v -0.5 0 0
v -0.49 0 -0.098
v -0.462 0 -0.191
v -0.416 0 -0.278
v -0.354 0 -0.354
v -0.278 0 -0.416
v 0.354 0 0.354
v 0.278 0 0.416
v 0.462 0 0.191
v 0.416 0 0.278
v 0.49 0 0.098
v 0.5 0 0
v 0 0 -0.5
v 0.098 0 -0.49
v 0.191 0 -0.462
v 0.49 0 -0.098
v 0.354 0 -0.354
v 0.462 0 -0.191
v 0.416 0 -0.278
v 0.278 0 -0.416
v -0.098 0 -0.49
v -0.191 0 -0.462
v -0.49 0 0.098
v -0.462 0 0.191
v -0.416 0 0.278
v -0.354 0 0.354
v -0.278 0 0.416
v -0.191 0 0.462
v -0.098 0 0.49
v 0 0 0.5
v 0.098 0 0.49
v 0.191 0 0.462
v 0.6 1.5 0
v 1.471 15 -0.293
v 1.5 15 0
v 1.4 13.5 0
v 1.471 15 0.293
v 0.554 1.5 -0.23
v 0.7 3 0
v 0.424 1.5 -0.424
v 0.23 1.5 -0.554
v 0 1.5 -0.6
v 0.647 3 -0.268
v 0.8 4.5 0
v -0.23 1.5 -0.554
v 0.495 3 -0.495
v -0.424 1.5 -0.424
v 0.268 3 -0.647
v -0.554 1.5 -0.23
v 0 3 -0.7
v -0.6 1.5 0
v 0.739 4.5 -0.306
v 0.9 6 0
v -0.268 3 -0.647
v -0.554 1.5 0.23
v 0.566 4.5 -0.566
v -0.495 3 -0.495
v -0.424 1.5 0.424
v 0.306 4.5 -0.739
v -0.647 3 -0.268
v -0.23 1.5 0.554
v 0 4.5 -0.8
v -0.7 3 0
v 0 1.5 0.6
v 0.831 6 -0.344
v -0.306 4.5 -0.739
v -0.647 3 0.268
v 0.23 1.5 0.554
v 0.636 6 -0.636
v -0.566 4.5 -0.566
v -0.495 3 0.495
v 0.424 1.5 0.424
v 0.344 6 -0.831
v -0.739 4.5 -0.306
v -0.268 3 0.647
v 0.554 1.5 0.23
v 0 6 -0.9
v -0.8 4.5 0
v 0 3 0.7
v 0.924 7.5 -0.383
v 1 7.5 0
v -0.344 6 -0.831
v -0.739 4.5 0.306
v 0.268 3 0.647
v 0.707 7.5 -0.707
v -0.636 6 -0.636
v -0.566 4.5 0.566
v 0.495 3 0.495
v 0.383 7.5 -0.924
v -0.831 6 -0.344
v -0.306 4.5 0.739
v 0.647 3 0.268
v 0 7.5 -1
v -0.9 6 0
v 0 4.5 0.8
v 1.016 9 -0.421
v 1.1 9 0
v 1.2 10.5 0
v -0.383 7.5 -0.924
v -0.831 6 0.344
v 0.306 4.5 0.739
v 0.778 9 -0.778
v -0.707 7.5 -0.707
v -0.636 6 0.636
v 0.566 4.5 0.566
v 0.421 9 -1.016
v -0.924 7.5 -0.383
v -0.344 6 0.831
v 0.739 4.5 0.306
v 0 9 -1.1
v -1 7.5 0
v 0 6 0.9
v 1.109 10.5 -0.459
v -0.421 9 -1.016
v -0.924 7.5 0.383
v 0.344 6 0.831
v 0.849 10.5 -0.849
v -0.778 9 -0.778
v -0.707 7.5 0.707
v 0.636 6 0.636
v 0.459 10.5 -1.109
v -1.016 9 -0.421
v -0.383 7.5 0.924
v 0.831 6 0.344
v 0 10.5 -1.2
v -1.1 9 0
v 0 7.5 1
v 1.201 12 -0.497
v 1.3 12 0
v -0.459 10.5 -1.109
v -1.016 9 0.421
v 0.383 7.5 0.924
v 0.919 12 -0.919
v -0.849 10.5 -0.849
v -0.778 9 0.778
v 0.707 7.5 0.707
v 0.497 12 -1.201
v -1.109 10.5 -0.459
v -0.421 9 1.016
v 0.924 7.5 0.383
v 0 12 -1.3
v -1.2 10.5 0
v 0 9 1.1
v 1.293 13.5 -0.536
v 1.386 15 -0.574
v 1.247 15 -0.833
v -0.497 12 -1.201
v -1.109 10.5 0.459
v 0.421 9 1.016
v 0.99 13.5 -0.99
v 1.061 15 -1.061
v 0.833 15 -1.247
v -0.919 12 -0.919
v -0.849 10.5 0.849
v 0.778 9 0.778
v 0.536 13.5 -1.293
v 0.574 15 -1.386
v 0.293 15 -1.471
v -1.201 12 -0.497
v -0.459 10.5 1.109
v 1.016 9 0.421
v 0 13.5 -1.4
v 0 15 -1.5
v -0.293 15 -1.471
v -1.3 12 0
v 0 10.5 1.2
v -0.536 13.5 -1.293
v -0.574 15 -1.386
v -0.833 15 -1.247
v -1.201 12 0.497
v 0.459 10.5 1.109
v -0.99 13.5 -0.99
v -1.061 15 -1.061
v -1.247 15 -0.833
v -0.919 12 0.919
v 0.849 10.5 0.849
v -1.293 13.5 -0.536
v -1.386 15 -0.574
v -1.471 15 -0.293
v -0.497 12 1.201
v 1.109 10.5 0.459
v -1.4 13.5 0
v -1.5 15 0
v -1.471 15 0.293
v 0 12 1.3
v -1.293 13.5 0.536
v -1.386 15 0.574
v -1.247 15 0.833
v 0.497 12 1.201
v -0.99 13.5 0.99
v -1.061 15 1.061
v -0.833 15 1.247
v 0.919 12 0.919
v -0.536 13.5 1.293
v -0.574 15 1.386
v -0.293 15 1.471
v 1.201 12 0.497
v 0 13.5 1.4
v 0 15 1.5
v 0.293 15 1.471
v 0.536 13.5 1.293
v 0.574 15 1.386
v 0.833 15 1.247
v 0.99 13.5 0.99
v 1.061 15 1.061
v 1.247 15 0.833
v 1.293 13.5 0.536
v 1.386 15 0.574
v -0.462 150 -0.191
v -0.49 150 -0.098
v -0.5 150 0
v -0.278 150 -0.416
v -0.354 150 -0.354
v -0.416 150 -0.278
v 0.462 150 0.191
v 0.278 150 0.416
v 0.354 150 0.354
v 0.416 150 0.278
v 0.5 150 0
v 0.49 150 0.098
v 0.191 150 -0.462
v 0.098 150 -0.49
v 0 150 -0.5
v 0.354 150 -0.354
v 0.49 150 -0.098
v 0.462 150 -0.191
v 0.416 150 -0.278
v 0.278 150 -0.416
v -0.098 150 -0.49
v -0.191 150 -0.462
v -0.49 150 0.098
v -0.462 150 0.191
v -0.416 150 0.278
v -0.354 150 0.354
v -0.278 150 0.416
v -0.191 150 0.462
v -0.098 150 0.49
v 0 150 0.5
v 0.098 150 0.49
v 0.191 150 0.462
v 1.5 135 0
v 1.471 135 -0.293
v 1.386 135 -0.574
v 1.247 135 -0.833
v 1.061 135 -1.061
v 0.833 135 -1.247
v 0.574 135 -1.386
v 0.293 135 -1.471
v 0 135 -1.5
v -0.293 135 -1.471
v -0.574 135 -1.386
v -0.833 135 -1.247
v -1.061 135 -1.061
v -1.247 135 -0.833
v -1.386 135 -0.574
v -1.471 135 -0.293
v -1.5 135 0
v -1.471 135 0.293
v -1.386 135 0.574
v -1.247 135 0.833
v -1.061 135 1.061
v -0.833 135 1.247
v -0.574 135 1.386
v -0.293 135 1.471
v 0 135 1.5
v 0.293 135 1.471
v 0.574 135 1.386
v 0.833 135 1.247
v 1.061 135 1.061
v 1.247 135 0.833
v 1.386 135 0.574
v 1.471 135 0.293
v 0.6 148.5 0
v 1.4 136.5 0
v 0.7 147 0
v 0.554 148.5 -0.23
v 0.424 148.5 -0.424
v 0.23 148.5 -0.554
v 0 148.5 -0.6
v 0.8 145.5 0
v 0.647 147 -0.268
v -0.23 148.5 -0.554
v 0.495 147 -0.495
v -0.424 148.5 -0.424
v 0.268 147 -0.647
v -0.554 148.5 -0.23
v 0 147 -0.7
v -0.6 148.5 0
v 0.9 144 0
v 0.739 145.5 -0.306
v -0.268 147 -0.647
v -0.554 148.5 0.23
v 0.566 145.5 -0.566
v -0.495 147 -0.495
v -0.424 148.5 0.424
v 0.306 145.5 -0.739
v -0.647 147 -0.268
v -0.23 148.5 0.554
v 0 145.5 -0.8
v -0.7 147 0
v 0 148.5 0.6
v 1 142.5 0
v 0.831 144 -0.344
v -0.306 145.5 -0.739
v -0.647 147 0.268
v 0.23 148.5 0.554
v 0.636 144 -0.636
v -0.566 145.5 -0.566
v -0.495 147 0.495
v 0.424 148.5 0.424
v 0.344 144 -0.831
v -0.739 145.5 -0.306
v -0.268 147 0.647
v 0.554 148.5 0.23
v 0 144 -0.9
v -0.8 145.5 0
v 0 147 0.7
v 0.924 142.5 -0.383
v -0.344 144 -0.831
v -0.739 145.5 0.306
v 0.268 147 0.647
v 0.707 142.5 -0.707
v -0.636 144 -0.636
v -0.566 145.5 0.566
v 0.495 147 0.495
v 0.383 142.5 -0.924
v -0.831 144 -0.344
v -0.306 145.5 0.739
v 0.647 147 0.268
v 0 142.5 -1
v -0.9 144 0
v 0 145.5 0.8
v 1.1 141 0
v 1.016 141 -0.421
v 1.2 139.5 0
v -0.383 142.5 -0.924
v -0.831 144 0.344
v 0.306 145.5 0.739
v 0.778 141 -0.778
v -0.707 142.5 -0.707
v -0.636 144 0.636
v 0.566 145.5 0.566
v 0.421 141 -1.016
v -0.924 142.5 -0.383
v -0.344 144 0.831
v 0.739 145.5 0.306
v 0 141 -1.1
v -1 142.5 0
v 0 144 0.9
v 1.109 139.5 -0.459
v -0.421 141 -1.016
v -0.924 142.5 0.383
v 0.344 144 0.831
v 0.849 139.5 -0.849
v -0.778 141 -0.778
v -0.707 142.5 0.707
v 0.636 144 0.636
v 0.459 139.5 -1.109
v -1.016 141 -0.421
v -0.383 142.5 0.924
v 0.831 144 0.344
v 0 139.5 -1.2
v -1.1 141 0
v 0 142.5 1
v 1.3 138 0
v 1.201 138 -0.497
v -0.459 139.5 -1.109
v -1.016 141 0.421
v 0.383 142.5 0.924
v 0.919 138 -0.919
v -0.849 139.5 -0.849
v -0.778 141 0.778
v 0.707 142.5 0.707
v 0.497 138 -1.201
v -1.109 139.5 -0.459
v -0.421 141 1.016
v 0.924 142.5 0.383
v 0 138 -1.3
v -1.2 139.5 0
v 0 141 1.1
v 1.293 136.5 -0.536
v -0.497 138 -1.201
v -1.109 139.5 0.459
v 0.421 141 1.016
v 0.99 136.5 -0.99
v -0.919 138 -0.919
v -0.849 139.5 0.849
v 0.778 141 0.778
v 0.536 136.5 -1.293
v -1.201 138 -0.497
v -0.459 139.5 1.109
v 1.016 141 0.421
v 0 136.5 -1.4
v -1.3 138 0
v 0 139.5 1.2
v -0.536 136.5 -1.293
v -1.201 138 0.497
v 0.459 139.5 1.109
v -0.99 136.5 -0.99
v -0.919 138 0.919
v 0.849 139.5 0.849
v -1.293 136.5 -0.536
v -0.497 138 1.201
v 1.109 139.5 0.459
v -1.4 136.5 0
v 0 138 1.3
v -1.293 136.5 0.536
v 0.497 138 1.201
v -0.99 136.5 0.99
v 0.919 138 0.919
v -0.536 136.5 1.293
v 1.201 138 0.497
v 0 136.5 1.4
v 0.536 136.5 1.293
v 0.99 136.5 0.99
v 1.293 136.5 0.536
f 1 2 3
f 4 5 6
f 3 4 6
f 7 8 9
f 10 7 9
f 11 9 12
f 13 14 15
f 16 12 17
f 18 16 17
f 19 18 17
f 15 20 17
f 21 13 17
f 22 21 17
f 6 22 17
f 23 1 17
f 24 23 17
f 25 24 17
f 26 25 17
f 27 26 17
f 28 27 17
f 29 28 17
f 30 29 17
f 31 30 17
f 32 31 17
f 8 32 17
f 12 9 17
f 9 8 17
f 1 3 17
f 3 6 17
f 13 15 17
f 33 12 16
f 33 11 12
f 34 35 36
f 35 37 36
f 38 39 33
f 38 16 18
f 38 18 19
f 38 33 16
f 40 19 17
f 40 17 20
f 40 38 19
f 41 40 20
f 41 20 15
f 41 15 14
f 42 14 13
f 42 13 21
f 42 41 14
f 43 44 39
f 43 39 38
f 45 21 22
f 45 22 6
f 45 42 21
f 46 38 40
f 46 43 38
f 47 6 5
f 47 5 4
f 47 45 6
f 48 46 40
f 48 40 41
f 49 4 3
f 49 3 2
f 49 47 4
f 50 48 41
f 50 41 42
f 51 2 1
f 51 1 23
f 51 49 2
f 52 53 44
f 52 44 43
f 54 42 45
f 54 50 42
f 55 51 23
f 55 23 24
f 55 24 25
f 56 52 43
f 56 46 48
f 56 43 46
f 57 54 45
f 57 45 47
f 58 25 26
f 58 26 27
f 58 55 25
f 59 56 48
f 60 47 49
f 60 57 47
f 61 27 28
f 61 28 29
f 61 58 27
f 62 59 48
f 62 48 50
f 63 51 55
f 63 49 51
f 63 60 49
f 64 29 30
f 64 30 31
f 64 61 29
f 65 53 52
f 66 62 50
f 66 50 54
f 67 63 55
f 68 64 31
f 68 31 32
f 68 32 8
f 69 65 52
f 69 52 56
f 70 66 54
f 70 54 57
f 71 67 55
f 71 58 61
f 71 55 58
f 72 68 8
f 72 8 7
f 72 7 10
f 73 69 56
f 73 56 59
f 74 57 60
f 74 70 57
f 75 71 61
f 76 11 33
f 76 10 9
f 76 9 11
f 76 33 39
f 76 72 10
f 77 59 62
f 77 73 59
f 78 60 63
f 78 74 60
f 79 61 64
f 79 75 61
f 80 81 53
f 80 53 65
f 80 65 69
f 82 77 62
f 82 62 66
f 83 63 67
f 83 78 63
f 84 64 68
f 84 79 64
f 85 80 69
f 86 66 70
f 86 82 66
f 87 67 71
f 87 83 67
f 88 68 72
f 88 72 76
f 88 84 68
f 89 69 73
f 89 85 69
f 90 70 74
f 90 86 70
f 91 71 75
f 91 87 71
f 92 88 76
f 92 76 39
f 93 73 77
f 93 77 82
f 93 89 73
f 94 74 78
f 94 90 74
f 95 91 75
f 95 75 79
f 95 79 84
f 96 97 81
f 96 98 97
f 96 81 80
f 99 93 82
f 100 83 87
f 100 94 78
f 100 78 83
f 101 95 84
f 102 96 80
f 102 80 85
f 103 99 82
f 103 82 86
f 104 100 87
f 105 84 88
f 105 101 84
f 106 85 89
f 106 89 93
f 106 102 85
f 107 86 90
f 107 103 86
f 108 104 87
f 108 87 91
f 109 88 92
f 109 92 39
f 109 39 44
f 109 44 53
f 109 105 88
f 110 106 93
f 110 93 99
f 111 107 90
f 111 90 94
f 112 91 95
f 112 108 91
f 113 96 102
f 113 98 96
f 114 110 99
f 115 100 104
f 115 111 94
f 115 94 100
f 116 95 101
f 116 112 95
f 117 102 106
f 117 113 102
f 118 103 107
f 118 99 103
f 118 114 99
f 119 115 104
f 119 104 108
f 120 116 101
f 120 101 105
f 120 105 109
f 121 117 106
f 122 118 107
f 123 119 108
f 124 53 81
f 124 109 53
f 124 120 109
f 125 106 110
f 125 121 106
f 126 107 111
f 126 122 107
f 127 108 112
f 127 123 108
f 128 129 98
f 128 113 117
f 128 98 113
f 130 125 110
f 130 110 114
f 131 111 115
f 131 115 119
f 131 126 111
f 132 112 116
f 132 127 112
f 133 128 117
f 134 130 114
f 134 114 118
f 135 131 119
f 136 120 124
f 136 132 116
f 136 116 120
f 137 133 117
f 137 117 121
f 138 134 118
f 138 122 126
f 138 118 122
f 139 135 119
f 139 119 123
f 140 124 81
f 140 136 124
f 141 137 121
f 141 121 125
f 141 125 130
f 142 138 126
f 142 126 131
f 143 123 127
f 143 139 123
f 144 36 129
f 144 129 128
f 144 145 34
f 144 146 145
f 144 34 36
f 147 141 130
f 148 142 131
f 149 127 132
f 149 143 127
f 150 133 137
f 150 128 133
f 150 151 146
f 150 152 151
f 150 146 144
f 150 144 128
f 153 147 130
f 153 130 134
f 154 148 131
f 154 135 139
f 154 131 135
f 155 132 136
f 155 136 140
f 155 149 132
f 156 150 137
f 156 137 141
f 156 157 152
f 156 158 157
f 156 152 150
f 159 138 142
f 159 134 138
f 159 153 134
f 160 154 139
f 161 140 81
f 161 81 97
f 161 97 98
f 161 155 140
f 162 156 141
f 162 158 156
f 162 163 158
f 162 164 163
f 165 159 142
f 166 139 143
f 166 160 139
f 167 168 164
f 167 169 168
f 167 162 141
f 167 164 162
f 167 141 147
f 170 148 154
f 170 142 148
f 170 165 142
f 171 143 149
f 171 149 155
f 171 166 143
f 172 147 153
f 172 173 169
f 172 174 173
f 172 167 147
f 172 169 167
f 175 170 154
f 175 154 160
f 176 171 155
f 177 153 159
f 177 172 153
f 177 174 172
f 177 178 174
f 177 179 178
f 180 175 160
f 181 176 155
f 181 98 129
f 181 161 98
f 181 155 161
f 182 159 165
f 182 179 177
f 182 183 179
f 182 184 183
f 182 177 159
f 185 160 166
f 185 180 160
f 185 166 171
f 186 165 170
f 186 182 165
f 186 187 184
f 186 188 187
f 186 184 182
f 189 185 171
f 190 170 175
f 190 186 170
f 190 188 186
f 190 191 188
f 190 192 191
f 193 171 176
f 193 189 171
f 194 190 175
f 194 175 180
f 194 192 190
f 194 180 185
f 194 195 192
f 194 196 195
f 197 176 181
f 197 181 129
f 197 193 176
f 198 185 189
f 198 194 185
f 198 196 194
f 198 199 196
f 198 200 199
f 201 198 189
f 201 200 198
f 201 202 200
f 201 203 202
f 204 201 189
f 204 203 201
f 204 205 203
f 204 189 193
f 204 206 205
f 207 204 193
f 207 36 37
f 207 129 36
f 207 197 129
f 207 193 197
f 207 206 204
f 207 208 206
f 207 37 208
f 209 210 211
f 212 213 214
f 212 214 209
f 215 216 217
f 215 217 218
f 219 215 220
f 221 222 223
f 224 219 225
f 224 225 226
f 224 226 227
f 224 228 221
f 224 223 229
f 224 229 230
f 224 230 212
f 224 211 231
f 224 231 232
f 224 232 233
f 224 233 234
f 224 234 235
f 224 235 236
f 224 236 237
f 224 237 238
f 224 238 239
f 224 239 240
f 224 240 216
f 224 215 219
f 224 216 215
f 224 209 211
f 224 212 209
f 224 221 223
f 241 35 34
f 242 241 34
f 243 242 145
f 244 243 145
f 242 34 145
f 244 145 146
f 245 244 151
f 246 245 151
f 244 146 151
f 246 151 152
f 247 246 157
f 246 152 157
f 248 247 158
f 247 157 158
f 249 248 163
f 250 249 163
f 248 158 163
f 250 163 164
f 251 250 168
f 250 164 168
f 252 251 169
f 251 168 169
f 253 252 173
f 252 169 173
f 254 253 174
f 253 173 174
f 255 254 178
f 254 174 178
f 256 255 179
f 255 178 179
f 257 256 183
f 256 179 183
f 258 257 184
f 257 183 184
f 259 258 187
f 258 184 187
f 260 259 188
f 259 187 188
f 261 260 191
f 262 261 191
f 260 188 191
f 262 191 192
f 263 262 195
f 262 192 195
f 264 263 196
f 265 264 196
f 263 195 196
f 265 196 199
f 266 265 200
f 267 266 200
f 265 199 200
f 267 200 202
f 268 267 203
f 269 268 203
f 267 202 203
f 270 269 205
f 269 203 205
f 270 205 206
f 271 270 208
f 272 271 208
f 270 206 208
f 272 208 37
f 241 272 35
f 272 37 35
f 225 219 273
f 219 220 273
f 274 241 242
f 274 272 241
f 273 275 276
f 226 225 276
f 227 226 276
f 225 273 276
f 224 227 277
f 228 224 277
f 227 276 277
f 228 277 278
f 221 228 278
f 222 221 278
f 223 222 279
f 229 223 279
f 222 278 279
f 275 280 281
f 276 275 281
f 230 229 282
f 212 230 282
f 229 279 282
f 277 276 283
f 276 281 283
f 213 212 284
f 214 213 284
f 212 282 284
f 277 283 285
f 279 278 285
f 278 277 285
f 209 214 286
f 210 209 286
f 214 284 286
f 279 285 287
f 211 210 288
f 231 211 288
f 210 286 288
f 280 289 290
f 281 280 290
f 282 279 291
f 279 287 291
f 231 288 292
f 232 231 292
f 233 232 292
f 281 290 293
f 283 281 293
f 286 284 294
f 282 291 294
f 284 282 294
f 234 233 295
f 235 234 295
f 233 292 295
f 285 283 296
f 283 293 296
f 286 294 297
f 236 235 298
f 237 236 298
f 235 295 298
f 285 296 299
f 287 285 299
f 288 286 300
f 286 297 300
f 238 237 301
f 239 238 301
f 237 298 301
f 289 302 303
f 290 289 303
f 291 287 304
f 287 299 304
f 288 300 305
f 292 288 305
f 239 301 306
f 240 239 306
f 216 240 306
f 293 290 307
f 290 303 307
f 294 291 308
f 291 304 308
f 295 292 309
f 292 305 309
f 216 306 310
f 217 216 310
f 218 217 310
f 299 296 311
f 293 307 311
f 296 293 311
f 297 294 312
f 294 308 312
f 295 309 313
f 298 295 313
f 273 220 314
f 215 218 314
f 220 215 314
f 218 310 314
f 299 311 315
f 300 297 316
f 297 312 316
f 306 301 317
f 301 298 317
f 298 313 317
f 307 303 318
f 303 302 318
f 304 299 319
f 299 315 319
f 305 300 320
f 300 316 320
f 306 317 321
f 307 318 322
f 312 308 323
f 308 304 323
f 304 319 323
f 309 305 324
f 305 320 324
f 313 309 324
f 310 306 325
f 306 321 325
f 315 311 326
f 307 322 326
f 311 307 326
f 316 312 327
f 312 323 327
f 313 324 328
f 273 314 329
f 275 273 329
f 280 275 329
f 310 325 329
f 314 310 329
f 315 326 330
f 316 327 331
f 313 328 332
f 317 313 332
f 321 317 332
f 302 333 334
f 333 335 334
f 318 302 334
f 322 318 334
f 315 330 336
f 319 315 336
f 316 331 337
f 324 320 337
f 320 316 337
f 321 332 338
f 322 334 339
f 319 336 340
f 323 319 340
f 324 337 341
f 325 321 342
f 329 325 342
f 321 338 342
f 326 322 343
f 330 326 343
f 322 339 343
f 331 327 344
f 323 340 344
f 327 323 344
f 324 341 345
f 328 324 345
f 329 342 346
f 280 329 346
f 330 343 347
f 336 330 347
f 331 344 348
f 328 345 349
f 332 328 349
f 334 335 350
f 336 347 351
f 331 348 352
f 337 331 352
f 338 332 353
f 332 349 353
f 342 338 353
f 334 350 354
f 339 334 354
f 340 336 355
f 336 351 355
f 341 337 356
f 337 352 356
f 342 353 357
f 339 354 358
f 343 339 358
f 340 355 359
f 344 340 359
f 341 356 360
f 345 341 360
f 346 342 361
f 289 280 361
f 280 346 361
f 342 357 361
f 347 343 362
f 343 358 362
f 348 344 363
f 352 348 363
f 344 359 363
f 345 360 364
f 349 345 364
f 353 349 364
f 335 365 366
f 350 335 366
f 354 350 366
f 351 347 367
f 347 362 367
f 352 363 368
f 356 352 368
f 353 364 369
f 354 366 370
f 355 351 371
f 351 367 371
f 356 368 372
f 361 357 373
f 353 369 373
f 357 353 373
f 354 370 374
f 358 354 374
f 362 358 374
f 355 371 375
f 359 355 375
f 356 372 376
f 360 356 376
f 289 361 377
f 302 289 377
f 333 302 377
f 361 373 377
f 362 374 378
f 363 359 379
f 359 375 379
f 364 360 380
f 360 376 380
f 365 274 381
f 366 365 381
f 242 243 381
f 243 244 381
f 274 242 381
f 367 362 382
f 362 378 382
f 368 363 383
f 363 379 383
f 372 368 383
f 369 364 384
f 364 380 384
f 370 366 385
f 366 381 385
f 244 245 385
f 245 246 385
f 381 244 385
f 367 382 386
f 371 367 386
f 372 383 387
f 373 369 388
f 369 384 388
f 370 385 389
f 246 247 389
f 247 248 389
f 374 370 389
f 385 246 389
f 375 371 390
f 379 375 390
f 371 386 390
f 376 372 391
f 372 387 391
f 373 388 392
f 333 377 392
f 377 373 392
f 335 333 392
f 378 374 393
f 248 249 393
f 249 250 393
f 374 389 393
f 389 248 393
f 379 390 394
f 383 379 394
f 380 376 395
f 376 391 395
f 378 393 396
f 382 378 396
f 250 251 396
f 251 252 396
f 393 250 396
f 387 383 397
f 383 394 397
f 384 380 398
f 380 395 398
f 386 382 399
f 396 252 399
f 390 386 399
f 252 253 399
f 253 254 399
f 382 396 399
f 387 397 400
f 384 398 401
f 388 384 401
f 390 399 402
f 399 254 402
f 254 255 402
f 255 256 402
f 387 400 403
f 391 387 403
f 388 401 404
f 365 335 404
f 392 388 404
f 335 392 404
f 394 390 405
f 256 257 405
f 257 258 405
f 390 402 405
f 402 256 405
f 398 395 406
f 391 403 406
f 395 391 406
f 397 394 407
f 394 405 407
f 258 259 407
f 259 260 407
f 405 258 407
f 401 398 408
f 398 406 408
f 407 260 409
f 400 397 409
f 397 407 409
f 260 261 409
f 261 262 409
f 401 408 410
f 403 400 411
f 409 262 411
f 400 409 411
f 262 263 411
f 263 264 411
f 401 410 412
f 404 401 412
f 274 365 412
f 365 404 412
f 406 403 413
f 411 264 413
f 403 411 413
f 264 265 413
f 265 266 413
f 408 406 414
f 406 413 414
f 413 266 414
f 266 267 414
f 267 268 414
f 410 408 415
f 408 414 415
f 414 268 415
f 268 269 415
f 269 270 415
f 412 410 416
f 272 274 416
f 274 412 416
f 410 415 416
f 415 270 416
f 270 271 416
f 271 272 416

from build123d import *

# Parameters (mm, degrees)
ESQUISSE1_R             = 1.5
BOSS_EXTRU_1_DEPTH      = 150
CHANFREIN1_SIZE         = 1
CHANFREIN1_SIZE2        = 15
CHANFREIN1_PART_2_SIZE  = 1
CHANFREIN1_PART_2_SIZE2 = 15


with BuildPart() as part:
    # Esquisse1 → Boss.-Extru.1 (new body)
    with BuildSketch(Plane(origin=(0, 0, 0), x_dir=(1, 0, 0), z_dir=(0, 1, 0))):
        Circle(ESQUISSE1_R)
    extrude(amount=BOSS_EXTRU_1_DEPTH)

    # Chanfrein1
    chanfrein1_edges = [part.edges().sort_by_distance(p)[0] for p in [
        (-1.5, 0, 0),
    ]]
    chanfrein1_side = [part.faces().sort_by_distance(p)[0] for p in [
        (0, 0, 0),
    ]]
    chamfer(chanfrein1_edges, length=CHANFREIN1_SIZE, length2=CHANFREIN1_SIZE2, reference=chanfrein1_side[0])

    # Chanfrein1 part 2
    chanfrein1_part_2_edges = [part.edges().sort_by_distance(p)[0] for p in [
        (-1.5, 150, 0),
    ]]
    chanfrein1_part_2_side = [part.faces().sort_by_distance(p)[0] for p in [
        (0, 150, 0),
    ]]
    chamfer(chanfrein1_part_2_edges, length=CHANFREIN1_PART_2_SIZE, length2=CHANFREIN1_PART_2_SIZE2, reference=chanfrein1_part_2_side[0])


solid = part.part
